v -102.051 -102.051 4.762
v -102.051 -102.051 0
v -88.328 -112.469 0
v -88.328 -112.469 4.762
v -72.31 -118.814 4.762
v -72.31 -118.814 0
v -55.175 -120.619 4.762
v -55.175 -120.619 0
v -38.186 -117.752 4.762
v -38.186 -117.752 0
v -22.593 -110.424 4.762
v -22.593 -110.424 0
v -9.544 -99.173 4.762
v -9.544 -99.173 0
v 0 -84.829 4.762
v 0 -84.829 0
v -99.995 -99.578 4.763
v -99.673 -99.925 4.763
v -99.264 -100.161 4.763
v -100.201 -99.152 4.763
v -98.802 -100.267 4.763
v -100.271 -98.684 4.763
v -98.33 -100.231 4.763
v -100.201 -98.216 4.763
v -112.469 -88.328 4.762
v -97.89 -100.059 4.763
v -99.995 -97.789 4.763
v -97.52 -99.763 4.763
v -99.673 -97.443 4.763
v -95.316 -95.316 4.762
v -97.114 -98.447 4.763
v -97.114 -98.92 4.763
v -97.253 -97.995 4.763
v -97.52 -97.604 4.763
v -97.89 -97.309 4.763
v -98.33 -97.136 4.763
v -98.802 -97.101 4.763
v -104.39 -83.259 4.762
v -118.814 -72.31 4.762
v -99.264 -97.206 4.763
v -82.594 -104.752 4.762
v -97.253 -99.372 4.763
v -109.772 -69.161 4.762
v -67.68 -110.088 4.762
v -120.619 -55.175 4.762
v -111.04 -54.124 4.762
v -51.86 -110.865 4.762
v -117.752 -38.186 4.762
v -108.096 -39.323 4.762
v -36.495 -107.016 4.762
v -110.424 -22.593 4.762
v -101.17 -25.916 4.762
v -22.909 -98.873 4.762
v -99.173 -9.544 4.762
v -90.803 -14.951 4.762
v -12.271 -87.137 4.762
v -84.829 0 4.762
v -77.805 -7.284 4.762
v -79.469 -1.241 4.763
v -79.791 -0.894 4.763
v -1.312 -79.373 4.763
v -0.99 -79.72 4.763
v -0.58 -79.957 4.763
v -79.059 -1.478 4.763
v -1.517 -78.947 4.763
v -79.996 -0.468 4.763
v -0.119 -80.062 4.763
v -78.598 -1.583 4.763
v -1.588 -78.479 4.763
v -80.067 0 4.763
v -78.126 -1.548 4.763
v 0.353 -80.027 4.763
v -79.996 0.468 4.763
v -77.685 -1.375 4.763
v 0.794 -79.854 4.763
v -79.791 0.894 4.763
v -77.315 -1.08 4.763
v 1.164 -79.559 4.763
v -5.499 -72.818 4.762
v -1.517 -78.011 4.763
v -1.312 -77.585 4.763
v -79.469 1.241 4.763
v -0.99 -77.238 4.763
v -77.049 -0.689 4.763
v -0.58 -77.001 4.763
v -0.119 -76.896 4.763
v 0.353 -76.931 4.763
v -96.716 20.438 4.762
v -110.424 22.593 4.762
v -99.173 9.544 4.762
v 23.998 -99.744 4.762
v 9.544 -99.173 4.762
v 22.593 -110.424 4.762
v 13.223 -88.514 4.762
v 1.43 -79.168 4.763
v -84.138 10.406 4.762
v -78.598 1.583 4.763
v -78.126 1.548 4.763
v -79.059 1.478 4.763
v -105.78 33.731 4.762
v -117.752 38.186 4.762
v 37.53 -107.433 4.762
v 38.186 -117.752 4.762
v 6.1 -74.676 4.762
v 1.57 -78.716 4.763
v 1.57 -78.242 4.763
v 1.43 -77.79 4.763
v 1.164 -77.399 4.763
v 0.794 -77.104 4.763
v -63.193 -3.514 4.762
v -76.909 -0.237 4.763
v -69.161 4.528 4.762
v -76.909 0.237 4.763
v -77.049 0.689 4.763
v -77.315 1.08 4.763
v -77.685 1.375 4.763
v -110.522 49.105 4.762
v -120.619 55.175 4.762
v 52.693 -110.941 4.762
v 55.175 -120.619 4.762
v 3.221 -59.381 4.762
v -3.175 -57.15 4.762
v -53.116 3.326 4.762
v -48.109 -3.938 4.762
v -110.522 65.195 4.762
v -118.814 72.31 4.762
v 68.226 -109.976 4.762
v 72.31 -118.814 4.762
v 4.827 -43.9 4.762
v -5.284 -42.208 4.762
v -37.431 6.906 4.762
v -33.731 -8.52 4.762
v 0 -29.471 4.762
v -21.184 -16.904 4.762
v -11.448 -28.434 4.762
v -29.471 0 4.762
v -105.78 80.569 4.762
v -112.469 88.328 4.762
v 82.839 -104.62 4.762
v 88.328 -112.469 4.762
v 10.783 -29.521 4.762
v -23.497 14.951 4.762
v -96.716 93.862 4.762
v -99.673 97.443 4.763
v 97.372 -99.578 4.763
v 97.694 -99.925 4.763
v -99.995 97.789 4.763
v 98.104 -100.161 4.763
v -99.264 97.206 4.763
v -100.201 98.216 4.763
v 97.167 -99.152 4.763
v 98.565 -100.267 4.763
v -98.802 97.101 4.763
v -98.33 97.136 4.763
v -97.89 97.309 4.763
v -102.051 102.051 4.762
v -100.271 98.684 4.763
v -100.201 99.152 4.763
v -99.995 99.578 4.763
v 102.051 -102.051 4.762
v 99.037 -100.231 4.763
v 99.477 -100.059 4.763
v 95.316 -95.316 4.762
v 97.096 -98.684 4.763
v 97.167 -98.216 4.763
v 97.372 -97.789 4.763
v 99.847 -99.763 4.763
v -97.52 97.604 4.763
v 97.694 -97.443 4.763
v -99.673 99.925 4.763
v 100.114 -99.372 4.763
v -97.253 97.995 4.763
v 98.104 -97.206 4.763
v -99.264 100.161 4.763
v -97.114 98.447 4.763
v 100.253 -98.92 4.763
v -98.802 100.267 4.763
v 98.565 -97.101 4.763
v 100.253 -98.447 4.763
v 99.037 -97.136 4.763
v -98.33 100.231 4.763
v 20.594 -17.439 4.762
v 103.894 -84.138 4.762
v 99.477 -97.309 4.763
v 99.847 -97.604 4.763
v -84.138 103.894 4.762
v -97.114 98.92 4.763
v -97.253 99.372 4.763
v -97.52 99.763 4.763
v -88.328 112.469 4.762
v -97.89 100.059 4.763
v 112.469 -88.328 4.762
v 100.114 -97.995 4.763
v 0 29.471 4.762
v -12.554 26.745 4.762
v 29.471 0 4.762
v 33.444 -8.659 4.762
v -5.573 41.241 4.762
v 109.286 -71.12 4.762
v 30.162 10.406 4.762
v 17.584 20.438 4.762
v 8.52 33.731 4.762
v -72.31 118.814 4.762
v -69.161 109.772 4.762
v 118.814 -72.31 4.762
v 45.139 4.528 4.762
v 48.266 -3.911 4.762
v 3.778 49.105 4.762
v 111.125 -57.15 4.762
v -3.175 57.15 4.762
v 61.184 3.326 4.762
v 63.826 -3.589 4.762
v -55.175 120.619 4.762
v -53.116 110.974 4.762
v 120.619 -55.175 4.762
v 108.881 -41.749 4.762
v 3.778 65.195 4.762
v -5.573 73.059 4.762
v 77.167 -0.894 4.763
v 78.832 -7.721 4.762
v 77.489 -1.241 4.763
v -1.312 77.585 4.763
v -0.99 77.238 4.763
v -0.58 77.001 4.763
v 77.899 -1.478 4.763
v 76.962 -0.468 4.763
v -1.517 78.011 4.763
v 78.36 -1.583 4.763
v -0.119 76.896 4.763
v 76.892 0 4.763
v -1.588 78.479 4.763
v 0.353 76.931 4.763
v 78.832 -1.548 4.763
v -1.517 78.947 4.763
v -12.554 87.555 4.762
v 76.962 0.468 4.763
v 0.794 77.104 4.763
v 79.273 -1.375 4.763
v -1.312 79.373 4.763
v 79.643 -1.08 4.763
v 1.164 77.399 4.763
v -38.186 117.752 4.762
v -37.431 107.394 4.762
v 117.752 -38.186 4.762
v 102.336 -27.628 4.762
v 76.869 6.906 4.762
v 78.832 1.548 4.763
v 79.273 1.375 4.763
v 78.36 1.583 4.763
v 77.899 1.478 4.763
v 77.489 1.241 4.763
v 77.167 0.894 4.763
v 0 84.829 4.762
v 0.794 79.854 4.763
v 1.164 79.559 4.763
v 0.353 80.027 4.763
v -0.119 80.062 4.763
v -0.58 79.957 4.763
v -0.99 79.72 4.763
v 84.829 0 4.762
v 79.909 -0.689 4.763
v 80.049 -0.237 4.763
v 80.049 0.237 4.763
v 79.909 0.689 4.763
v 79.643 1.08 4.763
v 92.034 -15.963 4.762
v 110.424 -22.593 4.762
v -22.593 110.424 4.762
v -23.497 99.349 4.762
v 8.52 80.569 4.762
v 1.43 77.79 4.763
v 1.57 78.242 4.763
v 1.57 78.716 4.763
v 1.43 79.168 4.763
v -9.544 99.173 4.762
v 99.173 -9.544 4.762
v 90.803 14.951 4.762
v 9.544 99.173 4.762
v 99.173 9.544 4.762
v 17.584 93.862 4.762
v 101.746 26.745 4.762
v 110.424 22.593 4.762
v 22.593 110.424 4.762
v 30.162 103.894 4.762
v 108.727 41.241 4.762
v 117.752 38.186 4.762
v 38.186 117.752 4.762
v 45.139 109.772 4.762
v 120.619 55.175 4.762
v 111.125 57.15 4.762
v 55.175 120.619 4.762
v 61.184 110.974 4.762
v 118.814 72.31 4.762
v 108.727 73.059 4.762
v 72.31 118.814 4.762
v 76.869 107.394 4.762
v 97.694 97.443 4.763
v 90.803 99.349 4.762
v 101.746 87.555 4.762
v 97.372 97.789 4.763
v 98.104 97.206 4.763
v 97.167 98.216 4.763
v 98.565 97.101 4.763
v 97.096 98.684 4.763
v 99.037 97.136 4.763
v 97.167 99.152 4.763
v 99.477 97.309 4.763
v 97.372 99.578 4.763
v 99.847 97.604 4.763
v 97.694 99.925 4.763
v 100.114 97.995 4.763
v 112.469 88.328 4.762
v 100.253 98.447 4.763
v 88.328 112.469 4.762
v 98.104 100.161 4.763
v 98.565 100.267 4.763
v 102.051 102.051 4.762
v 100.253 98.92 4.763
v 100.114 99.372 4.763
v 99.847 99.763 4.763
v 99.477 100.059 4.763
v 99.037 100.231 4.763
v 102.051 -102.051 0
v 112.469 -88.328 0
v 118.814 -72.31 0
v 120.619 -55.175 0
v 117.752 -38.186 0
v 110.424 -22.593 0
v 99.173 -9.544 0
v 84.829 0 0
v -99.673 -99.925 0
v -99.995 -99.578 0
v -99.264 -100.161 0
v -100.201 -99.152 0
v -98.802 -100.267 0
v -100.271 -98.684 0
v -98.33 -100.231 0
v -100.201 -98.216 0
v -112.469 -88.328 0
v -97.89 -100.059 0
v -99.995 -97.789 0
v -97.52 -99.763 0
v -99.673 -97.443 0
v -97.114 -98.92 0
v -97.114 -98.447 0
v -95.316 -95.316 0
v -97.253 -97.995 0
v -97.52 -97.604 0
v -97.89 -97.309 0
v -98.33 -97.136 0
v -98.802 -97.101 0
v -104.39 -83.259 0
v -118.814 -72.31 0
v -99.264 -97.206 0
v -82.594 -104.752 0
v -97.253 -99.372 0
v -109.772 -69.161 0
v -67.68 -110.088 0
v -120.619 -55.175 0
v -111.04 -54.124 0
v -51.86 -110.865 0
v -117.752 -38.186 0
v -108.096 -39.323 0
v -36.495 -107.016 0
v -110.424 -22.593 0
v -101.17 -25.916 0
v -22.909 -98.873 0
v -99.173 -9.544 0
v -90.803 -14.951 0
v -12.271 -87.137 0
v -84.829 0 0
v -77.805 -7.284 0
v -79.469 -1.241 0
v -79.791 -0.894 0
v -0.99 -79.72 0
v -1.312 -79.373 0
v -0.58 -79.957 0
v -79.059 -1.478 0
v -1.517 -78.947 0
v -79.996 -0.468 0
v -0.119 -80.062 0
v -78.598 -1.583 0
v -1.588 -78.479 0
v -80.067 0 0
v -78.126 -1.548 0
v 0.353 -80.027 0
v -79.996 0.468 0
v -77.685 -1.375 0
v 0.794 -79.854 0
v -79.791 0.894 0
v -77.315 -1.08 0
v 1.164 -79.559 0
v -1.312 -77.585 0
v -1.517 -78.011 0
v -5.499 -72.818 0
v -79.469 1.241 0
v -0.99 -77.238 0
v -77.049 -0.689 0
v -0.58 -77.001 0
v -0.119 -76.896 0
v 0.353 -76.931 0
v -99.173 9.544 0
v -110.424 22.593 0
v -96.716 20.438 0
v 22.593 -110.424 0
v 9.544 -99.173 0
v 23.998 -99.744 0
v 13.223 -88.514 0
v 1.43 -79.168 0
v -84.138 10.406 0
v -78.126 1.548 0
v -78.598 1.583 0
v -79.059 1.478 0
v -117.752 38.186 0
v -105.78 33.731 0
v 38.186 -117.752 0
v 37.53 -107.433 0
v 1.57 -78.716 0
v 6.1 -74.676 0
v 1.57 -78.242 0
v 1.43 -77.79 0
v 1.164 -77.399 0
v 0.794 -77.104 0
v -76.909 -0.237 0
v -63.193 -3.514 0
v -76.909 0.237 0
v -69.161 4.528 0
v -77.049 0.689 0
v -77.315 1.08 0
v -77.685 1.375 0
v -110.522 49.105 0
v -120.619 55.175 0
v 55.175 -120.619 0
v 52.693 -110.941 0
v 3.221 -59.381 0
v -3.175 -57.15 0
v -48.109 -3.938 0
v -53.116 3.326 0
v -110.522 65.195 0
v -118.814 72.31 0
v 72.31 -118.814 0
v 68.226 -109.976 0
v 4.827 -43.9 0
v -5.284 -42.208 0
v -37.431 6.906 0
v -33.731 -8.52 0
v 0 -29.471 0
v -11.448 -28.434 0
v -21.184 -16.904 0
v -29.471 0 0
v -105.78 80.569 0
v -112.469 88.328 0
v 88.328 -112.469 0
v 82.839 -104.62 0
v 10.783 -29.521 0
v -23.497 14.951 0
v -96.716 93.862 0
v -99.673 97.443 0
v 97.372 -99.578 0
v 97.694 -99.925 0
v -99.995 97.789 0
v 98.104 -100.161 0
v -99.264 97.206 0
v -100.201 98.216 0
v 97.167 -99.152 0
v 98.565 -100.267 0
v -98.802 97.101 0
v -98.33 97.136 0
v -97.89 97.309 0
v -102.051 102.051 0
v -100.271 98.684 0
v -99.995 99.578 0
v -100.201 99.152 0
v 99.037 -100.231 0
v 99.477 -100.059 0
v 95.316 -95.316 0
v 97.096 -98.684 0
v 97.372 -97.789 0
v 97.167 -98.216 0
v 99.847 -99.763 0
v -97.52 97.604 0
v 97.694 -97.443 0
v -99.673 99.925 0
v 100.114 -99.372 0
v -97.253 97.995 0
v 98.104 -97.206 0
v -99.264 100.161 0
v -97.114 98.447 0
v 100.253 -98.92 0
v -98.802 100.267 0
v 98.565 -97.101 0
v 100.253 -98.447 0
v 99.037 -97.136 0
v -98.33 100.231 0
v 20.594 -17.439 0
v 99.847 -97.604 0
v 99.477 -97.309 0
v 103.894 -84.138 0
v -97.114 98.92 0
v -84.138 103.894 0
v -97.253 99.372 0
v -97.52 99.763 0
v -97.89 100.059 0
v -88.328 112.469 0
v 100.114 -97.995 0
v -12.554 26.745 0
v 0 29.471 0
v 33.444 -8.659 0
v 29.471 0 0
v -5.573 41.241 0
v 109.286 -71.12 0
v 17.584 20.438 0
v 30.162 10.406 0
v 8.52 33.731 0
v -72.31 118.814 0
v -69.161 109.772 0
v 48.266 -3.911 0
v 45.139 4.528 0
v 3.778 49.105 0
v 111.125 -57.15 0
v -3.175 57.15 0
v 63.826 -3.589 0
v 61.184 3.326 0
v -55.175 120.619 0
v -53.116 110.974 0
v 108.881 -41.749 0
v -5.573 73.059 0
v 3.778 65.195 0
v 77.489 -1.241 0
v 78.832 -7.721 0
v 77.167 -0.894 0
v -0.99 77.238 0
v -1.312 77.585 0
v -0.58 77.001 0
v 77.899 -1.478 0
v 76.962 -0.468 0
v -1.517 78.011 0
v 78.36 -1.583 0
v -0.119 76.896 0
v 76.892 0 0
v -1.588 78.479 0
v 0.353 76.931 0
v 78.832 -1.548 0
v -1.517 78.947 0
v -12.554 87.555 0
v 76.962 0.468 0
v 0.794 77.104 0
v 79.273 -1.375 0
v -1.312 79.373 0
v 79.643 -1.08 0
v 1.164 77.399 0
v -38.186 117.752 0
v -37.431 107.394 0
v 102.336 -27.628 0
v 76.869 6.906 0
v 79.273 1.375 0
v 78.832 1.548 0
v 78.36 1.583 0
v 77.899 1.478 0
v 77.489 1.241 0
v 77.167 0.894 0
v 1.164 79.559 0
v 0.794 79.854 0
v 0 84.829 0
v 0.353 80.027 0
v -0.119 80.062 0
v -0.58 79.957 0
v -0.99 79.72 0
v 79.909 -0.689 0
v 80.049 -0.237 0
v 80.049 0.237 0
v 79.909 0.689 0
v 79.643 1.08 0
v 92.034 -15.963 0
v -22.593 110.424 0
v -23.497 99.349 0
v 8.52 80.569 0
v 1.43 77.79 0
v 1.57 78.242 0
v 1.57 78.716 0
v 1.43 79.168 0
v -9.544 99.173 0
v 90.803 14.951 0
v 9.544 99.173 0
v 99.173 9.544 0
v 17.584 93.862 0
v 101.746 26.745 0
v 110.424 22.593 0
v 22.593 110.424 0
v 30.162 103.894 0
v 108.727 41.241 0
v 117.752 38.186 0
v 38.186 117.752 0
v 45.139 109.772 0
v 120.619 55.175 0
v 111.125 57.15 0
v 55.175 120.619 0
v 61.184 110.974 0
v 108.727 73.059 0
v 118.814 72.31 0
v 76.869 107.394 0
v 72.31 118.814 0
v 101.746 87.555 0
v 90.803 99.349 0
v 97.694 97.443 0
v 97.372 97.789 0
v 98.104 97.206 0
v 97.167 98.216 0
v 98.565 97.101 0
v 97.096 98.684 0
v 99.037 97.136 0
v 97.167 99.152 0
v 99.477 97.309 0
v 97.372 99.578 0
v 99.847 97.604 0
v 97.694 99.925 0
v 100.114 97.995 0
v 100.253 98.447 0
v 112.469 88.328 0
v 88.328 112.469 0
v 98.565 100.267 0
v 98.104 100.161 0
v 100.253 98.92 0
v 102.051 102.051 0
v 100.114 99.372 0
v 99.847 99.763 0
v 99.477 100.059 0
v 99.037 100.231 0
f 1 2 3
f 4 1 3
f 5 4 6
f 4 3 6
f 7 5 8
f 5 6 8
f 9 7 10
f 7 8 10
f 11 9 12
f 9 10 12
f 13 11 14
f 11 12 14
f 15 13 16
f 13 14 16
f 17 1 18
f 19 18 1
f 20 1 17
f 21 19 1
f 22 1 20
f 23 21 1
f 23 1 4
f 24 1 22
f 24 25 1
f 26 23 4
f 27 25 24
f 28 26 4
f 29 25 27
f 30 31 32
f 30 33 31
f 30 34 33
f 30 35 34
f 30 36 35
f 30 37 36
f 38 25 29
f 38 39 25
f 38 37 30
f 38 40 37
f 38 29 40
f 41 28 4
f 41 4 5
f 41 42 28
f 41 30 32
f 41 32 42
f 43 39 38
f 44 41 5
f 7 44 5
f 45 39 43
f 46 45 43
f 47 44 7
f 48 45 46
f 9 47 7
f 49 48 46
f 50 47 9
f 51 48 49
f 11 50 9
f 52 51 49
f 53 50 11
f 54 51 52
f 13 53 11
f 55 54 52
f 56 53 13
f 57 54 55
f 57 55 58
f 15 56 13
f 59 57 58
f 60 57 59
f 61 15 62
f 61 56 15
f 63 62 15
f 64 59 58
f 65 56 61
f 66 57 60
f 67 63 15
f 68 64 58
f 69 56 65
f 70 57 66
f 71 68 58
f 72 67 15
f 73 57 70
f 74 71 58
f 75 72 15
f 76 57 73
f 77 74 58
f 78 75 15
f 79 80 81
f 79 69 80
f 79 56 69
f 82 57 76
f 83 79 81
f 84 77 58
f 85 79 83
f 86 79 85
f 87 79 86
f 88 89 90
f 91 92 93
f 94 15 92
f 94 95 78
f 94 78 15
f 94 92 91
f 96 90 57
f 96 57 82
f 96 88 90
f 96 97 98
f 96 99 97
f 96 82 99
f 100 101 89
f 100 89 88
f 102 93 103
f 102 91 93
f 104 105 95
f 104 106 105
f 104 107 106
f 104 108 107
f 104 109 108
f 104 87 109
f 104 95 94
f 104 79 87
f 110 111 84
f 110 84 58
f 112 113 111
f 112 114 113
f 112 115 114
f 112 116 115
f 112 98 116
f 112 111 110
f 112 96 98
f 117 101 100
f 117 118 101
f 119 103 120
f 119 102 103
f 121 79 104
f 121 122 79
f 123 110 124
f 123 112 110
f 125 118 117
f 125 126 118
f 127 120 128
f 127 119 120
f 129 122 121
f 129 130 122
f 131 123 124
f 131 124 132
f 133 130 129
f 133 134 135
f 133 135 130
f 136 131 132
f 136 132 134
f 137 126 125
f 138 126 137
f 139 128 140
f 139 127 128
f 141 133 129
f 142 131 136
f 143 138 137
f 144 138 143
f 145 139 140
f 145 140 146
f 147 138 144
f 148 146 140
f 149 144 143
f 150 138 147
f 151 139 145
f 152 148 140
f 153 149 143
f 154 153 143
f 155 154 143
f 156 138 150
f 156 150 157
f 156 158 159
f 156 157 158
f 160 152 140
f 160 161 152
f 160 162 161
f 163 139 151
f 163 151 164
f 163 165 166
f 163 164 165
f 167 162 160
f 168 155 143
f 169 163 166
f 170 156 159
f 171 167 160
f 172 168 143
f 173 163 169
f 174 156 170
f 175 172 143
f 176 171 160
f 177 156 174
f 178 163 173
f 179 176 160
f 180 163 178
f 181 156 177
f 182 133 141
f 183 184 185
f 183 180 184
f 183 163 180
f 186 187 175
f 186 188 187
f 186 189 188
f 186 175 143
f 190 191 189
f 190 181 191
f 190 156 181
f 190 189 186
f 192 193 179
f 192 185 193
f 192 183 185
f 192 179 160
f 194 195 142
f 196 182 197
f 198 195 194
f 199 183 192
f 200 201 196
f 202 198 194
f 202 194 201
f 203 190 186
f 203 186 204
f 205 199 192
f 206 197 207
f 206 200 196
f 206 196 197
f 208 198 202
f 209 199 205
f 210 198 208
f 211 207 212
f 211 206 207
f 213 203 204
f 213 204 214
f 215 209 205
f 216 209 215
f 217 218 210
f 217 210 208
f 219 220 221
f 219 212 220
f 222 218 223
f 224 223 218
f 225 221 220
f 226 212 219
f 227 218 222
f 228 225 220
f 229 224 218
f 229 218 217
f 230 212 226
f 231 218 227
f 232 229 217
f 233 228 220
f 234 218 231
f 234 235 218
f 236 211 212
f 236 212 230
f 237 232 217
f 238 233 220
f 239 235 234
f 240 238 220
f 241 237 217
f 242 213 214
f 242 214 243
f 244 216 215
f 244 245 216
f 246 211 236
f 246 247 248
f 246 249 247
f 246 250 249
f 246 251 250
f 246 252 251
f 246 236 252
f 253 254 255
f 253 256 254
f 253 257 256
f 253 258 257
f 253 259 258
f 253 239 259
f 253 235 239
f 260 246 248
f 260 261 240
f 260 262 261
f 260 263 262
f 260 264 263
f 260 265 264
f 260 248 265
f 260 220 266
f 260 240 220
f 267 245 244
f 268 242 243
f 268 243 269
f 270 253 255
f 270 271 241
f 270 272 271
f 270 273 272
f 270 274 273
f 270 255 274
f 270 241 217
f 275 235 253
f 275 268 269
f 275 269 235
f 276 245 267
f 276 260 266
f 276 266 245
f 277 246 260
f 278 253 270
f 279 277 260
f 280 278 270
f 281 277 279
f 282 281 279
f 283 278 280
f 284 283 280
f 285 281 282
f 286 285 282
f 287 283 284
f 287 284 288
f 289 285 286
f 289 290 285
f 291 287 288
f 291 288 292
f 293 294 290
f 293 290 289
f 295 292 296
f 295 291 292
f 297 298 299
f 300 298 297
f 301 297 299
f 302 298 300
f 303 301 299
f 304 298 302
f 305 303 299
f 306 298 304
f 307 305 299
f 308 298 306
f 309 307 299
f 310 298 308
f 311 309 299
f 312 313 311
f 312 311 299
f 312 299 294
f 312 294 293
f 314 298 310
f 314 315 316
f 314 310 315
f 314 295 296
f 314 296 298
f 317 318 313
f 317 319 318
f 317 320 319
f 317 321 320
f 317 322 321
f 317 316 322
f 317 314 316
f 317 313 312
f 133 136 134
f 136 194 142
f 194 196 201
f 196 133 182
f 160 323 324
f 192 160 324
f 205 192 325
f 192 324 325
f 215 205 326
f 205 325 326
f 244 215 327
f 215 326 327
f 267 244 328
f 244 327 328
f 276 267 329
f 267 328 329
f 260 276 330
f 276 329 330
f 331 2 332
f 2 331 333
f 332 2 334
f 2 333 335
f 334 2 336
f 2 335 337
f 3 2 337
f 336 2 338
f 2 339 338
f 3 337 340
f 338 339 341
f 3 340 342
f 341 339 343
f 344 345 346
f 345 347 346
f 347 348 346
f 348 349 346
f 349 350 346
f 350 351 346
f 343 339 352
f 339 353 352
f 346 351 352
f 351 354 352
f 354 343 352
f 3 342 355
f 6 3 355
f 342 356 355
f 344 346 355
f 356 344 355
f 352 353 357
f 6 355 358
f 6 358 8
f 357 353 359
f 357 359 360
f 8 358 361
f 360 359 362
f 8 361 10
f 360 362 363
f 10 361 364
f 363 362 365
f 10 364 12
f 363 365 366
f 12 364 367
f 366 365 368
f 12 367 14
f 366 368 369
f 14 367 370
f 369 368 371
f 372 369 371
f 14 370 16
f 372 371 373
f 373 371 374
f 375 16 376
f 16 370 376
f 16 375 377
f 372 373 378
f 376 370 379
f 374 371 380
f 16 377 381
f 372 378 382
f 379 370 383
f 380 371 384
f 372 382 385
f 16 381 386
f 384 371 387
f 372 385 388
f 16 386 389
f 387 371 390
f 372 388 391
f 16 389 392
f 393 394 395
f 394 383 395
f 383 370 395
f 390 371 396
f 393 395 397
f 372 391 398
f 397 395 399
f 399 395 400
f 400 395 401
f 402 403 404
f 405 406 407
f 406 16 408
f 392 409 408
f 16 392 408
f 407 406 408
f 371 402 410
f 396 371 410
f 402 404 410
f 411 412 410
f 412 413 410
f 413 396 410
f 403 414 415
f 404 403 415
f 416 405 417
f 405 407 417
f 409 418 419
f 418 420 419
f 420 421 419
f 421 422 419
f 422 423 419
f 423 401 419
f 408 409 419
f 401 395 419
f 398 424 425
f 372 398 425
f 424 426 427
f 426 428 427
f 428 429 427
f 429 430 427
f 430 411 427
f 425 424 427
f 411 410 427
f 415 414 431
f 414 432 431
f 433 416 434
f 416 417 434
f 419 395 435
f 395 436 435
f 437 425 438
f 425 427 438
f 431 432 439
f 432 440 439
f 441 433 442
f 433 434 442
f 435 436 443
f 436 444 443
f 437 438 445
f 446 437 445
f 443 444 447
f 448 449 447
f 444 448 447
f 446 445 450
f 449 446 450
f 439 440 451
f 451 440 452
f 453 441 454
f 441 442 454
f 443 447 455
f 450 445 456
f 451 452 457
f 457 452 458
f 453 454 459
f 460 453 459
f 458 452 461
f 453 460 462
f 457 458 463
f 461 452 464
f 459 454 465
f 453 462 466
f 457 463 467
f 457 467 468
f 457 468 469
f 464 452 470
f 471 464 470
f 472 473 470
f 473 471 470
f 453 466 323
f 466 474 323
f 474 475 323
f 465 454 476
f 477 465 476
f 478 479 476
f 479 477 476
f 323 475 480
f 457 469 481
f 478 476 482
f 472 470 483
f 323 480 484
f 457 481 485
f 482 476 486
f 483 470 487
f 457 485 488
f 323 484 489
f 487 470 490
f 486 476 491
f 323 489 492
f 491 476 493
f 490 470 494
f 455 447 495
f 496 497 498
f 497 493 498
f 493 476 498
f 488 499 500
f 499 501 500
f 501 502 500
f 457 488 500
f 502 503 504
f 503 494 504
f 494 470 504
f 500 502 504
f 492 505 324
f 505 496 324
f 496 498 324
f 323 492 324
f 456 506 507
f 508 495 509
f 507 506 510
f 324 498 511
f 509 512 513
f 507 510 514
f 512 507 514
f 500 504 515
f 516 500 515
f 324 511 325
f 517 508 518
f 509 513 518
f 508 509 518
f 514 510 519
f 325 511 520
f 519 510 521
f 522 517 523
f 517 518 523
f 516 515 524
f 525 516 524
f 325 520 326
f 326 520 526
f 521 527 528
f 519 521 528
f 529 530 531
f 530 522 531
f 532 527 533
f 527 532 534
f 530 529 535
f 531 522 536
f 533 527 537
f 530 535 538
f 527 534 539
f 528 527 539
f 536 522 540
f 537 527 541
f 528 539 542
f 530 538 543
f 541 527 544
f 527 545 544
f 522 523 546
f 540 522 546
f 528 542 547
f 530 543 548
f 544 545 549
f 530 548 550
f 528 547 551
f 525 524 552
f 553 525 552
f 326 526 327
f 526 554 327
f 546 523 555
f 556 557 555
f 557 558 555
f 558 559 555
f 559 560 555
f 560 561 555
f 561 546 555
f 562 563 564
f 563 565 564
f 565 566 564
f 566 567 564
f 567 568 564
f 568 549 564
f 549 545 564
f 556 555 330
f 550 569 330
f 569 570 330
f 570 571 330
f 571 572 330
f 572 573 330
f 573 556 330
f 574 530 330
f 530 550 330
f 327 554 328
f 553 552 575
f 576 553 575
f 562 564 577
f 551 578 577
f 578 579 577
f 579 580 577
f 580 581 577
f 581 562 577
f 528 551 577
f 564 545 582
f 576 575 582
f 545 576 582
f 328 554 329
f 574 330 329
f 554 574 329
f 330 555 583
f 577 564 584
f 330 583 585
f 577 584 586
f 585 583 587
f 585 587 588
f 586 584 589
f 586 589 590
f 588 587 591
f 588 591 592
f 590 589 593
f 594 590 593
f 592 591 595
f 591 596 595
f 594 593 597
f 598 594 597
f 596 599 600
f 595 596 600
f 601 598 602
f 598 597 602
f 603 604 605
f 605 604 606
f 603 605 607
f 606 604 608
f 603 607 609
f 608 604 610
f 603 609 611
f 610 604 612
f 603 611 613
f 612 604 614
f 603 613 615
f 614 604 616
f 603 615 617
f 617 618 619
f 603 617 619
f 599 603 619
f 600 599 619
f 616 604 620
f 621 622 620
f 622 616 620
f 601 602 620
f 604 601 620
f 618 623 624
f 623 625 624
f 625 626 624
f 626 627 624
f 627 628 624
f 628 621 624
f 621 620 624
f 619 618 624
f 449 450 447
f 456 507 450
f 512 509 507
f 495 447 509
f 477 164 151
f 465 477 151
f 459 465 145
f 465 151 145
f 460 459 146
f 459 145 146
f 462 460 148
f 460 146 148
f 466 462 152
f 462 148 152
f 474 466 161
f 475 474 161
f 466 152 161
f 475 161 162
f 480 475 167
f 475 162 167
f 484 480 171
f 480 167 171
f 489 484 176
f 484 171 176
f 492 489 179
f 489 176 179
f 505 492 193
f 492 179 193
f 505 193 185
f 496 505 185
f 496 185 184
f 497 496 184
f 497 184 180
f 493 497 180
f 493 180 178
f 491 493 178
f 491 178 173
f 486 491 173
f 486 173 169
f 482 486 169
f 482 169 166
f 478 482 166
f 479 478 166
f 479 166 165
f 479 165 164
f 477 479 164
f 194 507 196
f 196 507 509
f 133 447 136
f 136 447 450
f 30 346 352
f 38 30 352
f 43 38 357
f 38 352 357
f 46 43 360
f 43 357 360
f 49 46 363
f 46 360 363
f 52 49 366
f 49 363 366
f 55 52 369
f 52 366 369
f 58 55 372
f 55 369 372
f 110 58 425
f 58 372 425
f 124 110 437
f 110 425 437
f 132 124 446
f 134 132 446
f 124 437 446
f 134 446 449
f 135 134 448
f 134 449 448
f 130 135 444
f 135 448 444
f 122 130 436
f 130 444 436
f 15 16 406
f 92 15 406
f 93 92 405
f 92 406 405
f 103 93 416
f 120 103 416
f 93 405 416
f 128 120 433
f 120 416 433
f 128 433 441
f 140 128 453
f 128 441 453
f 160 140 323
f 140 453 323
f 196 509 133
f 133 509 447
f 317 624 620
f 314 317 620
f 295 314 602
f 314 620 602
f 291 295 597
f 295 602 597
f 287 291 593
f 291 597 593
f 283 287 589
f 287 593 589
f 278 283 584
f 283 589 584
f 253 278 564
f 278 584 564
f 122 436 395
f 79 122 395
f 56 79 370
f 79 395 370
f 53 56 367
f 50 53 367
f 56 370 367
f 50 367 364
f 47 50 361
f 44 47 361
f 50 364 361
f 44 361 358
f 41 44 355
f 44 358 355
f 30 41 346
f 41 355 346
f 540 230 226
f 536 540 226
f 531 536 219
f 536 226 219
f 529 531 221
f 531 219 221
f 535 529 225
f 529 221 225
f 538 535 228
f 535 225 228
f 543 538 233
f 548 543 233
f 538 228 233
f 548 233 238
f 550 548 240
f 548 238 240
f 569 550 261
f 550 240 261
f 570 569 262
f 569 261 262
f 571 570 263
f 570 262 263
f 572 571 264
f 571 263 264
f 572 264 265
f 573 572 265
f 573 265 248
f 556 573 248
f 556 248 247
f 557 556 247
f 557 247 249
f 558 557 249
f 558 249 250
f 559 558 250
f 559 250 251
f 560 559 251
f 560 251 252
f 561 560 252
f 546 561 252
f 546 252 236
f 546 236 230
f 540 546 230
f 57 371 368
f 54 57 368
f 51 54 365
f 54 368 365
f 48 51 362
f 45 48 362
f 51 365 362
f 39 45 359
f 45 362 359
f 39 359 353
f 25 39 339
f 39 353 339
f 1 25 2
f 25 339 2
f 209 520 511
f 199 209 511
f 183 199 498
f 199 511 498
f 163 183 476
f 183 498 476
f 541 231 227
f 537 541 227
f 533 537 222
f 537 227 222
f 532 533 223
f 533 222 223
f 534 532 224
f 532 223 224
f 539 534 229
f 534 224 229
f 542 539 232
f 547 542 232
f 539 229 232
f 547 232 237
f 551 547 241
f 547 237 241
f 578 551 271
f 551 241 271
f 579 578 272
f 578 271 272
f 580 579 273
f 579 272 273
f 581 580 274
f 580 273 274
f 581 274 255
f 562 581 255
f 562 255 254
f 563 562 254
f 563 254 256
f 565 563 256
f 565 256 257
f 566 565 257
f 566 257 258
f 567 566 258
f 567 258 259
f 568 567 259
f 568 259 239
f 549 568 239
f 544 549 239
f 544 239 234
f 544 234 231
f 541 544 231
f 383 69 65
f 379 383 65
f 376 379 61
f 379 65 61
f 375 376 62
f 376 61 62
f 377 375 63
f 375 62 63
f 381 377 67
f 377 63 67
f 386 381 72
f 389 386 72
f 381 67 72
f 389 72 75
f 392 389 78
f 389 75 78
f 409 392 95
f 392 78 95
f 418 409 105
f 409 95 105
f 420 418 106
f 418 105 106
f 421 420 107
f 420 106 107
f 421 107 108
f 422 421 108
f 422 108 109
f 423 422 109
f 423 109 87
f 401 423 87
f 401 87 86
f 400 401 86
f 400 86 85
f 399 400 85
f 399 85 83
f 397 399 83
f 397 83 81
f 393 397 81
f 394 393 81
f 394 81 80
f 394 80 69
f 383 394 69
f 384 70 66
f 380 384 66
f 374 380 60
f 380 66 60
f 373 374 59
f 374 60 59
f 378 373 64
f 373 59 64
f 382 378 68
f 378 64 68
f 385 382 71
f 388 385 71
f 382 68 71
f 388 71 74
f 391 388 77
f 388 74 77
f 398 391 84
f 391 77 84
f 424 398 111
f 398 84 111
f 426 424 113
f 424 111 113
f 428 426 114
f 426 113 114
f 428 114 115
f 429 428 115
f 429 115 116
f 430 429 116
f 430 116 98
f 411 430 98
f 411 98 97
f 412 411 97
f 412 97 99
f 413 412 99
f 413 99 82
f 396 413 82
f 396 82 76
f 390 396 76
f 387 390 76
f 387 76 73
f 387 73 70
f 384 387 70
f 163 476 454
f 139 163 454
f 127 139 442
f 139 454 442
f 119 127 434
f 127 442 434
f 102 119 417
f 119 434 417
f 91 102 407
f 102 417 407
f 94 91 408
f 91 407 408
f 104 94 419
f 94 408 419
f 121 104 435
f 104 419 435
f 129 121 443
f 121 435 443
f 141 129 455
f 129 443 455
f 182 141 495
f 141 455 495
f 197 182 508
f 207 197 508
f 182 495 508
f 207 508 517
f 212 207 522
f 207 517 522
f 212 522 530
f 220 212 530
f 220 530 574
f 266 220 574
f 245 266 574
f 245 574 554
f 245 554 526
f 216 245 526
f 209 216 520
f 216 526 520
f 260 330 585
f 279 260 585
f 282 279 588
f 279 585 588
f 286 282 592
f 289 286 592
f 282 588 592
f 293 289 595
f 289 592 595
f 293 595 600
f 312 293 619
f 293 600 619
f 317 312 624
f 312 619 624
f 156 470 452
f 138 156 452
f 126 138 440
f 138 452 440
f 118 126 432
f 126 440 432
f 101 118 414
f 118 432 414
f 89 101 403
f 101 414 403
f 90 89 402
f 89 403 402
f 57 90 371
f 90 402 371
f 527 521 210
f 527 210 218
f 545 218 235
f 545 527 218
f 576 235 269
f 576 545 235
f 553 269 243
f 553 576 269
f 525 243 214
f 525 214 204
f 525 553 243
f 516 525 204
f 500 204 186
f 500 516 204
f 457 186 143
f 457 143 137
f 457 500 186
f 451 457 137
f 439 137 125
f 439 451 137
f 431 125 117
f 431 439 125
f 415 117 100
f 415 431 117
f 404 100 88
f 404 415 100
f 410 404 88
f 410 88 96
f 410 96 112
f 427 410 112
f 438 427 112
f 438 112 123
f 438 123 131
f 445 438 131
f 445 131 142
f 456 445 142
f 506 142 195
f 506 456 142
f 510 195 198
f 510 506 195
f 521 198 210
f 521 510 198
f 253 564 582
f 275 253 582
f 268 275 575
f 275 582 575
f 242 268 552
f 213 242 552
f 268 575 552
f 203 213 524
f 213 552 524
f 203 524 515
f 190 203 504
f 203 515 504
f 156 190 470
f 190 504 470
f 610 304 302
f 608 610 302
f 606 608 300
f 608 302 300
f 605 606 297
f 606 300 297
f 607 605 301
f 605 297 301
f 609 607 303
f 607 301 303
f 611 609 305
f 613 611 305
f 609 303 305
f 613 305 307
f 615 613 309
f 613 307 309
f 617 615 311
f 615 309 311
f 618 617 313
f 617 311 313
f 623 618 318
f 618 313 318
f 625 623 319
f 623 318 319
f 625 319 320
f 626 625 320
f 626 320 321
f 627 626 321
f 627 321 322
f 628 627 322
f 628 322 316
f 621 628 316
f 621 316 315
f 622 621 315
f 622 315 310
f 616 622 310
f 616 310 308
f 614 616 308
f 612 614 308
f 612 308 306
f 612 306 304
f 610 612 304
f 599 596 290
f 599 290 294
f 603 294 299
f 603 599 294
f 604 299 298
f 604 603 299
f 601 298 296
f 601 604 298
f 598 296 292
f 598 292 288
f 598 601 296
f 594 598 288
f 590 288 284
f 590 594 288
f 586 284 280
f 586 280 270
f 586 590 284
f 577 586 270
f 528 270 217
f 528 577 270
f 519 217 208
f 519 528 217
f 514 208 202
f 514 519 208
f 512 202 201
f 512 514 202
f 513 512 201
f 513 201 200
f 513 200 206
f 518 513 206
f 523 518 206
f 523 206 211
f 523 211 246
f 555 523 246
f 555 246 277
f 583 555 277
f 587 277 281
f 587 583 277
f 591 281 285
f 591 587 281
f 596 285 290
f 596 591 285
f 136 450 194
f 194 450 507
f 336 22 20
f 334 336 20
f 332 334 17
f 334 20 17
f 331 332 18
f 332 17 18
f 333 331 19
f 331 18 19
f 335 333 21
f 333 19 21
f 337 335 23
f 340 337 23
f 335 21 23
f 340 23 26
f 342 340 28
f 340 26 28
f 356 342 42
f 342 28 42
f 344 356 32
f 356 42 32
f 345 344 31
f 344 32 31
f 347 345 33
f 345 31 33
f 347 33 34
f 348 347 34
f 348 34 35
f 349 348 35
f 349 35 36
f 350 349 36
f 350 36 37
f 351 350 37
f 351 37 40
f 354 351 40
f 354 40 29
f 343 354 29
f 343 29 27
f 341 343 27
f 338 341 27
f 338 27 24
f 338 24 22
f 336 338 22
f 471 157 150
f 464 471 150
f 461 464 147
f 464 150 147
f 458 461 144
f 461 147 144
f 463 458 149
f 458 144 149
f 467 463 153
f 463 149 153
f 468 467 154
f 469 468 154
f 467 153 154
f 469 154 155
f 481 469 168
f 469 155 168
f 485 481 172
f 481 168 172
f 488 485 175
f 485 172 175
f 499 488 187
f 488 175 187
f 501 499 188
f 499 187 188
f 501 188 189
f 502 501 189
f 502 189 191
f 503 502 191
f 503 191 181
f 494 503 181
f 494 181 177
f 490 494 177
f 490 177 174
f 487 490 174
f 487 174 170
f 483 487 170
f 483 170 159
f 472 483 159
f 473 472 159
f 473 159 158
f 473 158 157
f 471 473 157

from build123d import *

# Parameters (mm, degrees)
F0_R     = 53.975
F1_DEPTH = 4.7625
F2_D     = 3.175
F2_DEPTH = 9.525


with BuildPart() as f1:
    # F0 (on Top) → F1 (new body)
    with BuildSketch(Plane.XY):
        with BuildLine():
            ThreePointArc((0, -84.829008), (46.583097, -119.764619), (102.051281, -102.051281))
            ThreePointArc((102.051281, -102.051281), (119.764619, -46.583097), (84.829008, 0))
            ThreePointArc((84.829008, 0), (119.764619, 46.583097), (102.051281, 102.051281))
            ThreePointArc((102.051281, 102.051281), (46.583097, 119.764619), (0, 84.829008))
            ThreePointArc((0, 84.829008), (-46.583097, 119.764619), (-102.051281, 102.051281))
            ThreePointArc((-102.051281, 102.051281), (-119.764619, 46.583097), (-84.829008, 0))
            ThreePointArc((-84.829008, 0), (-119.764619, -46.583097), (-102.051281, -102.051281))
            ThreePointArc((-102.051281, -102.051281), (-46.583097, -119.764619), (0, -84.829008))
        make_face()
        with BuildLine():
            ThreePointArc((-3.175, -57.15), (-36.494662, -107.016398), (-95.316089, -95.316089))
            ThreePointArc((-95.316089, -95.316089), (-77.805338, -7.283602), (-3.175, -57.15))
        make_face(mode=Mode.SUBTRACT)
        with BuildLine():
            ThreePointArc((95.316089, -95.316089), (7.283602, -36.494662), (111.125, -57.15))
            ThreePointArc((111.125, -57.15), (107.016398, -77.805338), (95.316089, -95.316089))
        make_face(mode=Mode.SUBTRACT)
        Polygon((-29.470992, 0), (0, 29.470992), (29.470992, 0), (0, -29.470992), align=None, mode=Mode.SUBTRACT)
        with Locations((-57.15, 57.15)):
            Circle(F0_R, mode=Mode.SUBTRACT)
        with Locations((57.15, 57.15)):
            Circle(F0_R, mode=Mode.SUBTRACT)
    extrude(amount=F1_DEPTH)

    # F2
    with Locations(Plane(origin=(0, 0, 0), x_dir=(1, 0, 0), z_dir=(0, 0, -1))):
        with Locations((-98.683685, -98.683685), (-78.479008, 0), (-98.683685, 98.683685), (0, 78.479008), (98.683685, 98.683685), (78.479008, 0), (98.683685, -98.683685), (0, -78.479008)):
            Hole(F2_D / 2, depth=F2_DEPTH)


solid = f1.part
